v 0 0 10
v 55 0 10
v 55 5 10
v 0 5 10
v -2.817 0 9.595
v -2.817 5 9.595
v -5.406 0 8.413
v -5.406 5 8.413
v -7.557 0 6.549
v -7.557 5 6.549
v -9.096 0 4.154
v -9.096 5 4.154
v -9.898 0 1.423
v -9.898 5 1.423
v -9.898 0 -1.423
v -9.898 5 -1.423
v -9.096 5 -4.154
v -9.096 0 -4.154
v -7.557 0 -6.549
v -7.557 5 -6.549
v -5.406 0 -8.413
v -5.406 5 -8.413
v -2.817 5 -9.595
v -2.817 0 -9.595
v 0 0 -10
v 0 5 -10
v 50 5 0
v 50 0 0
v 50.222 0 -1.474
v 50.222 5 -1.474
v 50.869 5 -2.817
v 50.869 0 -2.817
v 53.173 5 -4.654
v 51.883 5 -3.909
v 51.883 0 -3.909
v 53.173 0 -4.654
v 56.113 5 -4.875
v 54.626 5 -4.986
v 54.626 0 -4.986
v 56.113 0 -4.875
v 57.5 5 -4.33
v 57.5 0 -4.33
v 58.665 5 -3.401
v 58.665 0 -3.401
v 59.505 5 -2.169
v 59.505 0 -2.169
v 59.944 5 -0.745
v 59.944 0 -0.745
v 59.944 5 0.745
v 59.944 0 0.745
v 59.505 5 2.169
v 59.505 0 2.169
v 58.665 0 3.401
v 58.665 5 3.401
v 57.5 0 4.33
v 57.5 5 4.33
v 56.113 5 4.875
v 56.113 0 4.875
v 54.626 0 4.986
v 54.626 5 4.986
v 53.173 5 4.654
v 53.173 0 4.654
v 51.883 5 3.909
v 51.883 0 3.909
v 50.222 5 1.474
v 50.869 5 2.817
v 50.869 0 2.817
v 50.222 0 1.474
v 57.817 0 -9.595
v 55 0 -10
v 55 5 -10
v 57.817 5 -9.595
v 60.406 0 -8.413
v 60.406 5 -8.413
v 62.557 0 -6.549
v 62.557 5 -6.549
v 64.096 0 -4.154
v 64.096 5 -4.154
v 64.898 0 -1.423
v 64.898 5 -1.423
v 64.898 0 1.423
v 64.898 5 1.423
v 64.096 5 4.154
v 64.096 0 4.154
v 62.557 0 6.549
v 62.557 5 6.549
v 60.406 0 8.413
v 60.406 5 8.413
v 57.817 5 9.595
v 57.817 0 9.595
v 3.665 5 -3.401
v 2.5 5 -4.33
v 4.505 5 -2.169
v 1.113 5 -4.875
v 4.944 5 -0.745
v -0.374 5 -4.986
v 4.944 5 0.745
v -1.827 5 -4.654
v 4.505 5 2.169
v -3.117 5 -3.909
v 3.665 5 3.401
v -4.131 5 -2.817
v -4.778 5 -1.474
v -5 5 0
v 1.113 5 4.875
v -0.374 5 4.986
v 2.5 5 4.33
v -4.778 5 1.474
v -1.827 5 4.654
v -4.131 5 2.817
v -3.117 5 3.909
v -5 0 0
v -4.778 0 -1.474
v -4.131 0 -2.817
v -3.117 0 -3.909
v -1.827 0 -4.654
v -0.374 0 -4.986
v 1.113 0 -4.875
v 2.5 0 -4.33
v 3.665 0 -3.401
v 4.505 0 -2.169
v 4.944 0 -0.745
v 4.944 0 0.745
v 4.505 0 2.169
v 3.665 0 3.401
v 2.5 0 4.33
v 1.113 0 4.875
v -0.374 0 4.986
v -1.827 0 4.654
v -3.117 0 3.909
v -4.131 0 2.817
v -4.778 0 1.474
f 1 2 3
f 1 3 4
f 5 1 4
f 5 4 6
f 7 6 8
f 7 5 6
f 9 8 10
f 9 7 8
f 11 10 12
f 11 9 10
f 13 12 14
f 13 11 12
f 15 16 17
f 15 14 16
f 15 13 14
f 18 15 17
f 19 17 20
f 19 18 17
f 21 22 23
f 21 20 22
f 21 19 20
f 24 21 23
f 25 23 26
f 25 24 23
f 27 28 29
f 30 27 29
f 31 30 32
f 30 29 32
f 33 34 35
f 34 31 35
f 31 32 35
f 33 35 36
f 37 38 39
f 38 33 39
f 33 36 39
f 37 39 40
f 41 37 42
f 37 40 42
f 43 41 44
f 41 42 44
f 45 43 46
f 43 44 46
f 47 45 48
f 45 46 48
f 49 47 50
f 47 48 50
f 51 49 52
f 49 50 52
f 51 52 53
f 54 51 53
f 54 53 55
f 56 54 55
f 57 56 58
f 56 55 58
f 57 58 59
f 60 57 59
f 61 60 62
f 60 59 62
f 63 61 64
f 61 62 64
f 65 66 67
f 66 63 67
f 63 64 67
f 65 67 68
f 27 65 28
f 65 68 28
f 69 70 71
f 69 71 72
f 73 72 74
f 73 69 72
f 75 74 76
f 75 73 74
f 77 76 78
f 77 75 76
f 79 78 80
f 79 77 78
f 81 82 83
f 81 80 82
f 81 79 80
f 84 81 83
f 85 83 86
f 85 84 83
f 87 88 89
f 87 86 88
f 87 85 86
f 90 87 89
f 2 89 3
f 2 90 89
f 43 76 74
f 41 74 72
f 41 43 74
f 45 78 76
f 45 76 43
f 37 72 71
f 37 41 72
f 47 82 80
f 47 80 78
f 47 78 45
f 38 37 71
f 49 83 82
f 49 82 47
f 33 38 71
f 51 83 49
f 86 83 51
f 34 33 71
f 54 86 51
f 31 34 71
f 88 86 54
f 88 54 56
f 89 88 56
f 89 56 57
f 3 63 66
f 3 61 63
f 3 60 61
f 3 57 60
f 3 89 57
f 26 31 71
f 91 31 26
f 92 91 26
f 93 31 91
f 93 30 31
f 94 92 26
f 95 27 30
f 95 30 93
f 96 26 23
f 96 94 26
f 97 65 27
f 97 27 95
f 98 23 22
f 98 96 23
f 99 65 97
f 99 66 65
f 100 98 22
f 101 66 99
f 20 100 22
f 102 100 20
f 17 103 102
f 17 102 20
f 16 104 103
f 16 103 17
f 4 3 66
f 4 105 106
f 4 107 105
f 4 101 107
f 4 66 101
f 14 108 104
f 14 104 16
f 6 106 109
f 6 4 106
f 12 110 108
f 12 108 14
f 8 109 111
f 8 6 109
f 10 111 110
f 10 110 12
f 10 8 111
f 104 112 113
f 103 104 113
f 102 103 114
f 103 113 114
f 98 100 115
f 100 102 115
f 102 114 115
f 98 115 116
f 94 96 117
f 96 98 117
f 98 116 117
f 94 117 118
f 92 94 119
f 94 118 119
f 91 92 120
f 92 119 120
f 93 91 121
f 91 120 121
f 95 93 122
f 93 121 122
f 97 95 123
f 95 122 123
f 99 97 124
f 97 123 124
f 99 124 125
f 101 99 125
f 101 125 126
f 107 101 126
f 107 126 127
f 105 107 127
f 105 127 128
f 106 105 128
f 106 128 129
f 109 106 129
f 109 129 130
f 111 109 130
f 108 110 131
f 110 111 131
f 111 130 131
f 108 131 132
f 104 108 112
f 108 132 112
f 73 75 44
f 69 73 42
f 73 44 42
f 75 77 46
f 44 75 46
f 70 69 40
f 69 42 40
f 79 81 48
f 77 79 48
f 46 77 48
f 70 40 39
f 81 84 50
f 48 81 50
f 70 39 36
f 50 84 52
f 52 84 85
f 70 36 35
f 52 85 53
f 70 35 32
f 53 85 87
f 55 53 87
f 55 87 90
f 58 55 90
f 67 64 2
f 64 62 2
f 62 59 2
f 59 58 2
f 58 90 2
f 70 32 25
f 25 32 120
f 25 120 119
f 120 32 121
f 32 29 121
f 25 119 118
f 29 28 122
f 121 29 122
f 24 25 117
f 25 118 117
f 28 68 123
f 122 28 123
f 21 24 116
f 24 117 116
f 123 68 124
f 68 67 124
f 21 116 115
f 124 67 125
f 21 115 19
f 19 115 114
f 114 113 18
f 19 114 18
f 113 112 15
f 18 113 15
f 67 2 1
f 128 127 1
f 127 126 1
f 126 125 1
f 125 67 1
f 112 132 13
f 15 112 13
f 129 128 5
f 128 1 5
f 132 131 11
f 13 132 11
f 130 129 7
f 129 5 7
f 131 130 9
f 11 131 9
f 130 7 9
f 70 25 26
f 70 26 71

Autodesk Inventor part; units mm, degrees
ref_plane "YZ Plane" through (0, 0, 0) normal (1, 0, 0) x (0, 1, 0)
ref_plane "XZ Plane" through (0, 0, 0) normal (0, 1, 0) x (-1, 0, 0)
ref_plane "XY Plane" through (0, 0, 0) normal (0, 0, 1) x (1, 0, 0)
sketch "草圖3" plane through (0, 0, 0) normal (0, 1, 0) x (-1, 0, 0)
  line L0 (-65, 0) -> (10, 0) construction
  line L1 (-55, 10) -> (0, 10)
  line L2 (0, -10) -> (-55, -10)
  arc A0 (-55, 10) -> (-55, -10) centre (-55, 0) ccw
  arc A1 (0, -10) -> (0, 10) centre (0, 0) ccw
  circle A2 centre (-55, 0) radius 5
  circle A3 centre (0, 0) radius 5
  point P0 (-27.5, 0)
  dimension "hole" = 10
  dimension "d14" = 20
  dimension "center_distance" = 55
extrude "擠出3" add sketch "草圖3" along normal blind 5
equation "\"d14\" = 2 * hole"
properties part number "Binary link"
